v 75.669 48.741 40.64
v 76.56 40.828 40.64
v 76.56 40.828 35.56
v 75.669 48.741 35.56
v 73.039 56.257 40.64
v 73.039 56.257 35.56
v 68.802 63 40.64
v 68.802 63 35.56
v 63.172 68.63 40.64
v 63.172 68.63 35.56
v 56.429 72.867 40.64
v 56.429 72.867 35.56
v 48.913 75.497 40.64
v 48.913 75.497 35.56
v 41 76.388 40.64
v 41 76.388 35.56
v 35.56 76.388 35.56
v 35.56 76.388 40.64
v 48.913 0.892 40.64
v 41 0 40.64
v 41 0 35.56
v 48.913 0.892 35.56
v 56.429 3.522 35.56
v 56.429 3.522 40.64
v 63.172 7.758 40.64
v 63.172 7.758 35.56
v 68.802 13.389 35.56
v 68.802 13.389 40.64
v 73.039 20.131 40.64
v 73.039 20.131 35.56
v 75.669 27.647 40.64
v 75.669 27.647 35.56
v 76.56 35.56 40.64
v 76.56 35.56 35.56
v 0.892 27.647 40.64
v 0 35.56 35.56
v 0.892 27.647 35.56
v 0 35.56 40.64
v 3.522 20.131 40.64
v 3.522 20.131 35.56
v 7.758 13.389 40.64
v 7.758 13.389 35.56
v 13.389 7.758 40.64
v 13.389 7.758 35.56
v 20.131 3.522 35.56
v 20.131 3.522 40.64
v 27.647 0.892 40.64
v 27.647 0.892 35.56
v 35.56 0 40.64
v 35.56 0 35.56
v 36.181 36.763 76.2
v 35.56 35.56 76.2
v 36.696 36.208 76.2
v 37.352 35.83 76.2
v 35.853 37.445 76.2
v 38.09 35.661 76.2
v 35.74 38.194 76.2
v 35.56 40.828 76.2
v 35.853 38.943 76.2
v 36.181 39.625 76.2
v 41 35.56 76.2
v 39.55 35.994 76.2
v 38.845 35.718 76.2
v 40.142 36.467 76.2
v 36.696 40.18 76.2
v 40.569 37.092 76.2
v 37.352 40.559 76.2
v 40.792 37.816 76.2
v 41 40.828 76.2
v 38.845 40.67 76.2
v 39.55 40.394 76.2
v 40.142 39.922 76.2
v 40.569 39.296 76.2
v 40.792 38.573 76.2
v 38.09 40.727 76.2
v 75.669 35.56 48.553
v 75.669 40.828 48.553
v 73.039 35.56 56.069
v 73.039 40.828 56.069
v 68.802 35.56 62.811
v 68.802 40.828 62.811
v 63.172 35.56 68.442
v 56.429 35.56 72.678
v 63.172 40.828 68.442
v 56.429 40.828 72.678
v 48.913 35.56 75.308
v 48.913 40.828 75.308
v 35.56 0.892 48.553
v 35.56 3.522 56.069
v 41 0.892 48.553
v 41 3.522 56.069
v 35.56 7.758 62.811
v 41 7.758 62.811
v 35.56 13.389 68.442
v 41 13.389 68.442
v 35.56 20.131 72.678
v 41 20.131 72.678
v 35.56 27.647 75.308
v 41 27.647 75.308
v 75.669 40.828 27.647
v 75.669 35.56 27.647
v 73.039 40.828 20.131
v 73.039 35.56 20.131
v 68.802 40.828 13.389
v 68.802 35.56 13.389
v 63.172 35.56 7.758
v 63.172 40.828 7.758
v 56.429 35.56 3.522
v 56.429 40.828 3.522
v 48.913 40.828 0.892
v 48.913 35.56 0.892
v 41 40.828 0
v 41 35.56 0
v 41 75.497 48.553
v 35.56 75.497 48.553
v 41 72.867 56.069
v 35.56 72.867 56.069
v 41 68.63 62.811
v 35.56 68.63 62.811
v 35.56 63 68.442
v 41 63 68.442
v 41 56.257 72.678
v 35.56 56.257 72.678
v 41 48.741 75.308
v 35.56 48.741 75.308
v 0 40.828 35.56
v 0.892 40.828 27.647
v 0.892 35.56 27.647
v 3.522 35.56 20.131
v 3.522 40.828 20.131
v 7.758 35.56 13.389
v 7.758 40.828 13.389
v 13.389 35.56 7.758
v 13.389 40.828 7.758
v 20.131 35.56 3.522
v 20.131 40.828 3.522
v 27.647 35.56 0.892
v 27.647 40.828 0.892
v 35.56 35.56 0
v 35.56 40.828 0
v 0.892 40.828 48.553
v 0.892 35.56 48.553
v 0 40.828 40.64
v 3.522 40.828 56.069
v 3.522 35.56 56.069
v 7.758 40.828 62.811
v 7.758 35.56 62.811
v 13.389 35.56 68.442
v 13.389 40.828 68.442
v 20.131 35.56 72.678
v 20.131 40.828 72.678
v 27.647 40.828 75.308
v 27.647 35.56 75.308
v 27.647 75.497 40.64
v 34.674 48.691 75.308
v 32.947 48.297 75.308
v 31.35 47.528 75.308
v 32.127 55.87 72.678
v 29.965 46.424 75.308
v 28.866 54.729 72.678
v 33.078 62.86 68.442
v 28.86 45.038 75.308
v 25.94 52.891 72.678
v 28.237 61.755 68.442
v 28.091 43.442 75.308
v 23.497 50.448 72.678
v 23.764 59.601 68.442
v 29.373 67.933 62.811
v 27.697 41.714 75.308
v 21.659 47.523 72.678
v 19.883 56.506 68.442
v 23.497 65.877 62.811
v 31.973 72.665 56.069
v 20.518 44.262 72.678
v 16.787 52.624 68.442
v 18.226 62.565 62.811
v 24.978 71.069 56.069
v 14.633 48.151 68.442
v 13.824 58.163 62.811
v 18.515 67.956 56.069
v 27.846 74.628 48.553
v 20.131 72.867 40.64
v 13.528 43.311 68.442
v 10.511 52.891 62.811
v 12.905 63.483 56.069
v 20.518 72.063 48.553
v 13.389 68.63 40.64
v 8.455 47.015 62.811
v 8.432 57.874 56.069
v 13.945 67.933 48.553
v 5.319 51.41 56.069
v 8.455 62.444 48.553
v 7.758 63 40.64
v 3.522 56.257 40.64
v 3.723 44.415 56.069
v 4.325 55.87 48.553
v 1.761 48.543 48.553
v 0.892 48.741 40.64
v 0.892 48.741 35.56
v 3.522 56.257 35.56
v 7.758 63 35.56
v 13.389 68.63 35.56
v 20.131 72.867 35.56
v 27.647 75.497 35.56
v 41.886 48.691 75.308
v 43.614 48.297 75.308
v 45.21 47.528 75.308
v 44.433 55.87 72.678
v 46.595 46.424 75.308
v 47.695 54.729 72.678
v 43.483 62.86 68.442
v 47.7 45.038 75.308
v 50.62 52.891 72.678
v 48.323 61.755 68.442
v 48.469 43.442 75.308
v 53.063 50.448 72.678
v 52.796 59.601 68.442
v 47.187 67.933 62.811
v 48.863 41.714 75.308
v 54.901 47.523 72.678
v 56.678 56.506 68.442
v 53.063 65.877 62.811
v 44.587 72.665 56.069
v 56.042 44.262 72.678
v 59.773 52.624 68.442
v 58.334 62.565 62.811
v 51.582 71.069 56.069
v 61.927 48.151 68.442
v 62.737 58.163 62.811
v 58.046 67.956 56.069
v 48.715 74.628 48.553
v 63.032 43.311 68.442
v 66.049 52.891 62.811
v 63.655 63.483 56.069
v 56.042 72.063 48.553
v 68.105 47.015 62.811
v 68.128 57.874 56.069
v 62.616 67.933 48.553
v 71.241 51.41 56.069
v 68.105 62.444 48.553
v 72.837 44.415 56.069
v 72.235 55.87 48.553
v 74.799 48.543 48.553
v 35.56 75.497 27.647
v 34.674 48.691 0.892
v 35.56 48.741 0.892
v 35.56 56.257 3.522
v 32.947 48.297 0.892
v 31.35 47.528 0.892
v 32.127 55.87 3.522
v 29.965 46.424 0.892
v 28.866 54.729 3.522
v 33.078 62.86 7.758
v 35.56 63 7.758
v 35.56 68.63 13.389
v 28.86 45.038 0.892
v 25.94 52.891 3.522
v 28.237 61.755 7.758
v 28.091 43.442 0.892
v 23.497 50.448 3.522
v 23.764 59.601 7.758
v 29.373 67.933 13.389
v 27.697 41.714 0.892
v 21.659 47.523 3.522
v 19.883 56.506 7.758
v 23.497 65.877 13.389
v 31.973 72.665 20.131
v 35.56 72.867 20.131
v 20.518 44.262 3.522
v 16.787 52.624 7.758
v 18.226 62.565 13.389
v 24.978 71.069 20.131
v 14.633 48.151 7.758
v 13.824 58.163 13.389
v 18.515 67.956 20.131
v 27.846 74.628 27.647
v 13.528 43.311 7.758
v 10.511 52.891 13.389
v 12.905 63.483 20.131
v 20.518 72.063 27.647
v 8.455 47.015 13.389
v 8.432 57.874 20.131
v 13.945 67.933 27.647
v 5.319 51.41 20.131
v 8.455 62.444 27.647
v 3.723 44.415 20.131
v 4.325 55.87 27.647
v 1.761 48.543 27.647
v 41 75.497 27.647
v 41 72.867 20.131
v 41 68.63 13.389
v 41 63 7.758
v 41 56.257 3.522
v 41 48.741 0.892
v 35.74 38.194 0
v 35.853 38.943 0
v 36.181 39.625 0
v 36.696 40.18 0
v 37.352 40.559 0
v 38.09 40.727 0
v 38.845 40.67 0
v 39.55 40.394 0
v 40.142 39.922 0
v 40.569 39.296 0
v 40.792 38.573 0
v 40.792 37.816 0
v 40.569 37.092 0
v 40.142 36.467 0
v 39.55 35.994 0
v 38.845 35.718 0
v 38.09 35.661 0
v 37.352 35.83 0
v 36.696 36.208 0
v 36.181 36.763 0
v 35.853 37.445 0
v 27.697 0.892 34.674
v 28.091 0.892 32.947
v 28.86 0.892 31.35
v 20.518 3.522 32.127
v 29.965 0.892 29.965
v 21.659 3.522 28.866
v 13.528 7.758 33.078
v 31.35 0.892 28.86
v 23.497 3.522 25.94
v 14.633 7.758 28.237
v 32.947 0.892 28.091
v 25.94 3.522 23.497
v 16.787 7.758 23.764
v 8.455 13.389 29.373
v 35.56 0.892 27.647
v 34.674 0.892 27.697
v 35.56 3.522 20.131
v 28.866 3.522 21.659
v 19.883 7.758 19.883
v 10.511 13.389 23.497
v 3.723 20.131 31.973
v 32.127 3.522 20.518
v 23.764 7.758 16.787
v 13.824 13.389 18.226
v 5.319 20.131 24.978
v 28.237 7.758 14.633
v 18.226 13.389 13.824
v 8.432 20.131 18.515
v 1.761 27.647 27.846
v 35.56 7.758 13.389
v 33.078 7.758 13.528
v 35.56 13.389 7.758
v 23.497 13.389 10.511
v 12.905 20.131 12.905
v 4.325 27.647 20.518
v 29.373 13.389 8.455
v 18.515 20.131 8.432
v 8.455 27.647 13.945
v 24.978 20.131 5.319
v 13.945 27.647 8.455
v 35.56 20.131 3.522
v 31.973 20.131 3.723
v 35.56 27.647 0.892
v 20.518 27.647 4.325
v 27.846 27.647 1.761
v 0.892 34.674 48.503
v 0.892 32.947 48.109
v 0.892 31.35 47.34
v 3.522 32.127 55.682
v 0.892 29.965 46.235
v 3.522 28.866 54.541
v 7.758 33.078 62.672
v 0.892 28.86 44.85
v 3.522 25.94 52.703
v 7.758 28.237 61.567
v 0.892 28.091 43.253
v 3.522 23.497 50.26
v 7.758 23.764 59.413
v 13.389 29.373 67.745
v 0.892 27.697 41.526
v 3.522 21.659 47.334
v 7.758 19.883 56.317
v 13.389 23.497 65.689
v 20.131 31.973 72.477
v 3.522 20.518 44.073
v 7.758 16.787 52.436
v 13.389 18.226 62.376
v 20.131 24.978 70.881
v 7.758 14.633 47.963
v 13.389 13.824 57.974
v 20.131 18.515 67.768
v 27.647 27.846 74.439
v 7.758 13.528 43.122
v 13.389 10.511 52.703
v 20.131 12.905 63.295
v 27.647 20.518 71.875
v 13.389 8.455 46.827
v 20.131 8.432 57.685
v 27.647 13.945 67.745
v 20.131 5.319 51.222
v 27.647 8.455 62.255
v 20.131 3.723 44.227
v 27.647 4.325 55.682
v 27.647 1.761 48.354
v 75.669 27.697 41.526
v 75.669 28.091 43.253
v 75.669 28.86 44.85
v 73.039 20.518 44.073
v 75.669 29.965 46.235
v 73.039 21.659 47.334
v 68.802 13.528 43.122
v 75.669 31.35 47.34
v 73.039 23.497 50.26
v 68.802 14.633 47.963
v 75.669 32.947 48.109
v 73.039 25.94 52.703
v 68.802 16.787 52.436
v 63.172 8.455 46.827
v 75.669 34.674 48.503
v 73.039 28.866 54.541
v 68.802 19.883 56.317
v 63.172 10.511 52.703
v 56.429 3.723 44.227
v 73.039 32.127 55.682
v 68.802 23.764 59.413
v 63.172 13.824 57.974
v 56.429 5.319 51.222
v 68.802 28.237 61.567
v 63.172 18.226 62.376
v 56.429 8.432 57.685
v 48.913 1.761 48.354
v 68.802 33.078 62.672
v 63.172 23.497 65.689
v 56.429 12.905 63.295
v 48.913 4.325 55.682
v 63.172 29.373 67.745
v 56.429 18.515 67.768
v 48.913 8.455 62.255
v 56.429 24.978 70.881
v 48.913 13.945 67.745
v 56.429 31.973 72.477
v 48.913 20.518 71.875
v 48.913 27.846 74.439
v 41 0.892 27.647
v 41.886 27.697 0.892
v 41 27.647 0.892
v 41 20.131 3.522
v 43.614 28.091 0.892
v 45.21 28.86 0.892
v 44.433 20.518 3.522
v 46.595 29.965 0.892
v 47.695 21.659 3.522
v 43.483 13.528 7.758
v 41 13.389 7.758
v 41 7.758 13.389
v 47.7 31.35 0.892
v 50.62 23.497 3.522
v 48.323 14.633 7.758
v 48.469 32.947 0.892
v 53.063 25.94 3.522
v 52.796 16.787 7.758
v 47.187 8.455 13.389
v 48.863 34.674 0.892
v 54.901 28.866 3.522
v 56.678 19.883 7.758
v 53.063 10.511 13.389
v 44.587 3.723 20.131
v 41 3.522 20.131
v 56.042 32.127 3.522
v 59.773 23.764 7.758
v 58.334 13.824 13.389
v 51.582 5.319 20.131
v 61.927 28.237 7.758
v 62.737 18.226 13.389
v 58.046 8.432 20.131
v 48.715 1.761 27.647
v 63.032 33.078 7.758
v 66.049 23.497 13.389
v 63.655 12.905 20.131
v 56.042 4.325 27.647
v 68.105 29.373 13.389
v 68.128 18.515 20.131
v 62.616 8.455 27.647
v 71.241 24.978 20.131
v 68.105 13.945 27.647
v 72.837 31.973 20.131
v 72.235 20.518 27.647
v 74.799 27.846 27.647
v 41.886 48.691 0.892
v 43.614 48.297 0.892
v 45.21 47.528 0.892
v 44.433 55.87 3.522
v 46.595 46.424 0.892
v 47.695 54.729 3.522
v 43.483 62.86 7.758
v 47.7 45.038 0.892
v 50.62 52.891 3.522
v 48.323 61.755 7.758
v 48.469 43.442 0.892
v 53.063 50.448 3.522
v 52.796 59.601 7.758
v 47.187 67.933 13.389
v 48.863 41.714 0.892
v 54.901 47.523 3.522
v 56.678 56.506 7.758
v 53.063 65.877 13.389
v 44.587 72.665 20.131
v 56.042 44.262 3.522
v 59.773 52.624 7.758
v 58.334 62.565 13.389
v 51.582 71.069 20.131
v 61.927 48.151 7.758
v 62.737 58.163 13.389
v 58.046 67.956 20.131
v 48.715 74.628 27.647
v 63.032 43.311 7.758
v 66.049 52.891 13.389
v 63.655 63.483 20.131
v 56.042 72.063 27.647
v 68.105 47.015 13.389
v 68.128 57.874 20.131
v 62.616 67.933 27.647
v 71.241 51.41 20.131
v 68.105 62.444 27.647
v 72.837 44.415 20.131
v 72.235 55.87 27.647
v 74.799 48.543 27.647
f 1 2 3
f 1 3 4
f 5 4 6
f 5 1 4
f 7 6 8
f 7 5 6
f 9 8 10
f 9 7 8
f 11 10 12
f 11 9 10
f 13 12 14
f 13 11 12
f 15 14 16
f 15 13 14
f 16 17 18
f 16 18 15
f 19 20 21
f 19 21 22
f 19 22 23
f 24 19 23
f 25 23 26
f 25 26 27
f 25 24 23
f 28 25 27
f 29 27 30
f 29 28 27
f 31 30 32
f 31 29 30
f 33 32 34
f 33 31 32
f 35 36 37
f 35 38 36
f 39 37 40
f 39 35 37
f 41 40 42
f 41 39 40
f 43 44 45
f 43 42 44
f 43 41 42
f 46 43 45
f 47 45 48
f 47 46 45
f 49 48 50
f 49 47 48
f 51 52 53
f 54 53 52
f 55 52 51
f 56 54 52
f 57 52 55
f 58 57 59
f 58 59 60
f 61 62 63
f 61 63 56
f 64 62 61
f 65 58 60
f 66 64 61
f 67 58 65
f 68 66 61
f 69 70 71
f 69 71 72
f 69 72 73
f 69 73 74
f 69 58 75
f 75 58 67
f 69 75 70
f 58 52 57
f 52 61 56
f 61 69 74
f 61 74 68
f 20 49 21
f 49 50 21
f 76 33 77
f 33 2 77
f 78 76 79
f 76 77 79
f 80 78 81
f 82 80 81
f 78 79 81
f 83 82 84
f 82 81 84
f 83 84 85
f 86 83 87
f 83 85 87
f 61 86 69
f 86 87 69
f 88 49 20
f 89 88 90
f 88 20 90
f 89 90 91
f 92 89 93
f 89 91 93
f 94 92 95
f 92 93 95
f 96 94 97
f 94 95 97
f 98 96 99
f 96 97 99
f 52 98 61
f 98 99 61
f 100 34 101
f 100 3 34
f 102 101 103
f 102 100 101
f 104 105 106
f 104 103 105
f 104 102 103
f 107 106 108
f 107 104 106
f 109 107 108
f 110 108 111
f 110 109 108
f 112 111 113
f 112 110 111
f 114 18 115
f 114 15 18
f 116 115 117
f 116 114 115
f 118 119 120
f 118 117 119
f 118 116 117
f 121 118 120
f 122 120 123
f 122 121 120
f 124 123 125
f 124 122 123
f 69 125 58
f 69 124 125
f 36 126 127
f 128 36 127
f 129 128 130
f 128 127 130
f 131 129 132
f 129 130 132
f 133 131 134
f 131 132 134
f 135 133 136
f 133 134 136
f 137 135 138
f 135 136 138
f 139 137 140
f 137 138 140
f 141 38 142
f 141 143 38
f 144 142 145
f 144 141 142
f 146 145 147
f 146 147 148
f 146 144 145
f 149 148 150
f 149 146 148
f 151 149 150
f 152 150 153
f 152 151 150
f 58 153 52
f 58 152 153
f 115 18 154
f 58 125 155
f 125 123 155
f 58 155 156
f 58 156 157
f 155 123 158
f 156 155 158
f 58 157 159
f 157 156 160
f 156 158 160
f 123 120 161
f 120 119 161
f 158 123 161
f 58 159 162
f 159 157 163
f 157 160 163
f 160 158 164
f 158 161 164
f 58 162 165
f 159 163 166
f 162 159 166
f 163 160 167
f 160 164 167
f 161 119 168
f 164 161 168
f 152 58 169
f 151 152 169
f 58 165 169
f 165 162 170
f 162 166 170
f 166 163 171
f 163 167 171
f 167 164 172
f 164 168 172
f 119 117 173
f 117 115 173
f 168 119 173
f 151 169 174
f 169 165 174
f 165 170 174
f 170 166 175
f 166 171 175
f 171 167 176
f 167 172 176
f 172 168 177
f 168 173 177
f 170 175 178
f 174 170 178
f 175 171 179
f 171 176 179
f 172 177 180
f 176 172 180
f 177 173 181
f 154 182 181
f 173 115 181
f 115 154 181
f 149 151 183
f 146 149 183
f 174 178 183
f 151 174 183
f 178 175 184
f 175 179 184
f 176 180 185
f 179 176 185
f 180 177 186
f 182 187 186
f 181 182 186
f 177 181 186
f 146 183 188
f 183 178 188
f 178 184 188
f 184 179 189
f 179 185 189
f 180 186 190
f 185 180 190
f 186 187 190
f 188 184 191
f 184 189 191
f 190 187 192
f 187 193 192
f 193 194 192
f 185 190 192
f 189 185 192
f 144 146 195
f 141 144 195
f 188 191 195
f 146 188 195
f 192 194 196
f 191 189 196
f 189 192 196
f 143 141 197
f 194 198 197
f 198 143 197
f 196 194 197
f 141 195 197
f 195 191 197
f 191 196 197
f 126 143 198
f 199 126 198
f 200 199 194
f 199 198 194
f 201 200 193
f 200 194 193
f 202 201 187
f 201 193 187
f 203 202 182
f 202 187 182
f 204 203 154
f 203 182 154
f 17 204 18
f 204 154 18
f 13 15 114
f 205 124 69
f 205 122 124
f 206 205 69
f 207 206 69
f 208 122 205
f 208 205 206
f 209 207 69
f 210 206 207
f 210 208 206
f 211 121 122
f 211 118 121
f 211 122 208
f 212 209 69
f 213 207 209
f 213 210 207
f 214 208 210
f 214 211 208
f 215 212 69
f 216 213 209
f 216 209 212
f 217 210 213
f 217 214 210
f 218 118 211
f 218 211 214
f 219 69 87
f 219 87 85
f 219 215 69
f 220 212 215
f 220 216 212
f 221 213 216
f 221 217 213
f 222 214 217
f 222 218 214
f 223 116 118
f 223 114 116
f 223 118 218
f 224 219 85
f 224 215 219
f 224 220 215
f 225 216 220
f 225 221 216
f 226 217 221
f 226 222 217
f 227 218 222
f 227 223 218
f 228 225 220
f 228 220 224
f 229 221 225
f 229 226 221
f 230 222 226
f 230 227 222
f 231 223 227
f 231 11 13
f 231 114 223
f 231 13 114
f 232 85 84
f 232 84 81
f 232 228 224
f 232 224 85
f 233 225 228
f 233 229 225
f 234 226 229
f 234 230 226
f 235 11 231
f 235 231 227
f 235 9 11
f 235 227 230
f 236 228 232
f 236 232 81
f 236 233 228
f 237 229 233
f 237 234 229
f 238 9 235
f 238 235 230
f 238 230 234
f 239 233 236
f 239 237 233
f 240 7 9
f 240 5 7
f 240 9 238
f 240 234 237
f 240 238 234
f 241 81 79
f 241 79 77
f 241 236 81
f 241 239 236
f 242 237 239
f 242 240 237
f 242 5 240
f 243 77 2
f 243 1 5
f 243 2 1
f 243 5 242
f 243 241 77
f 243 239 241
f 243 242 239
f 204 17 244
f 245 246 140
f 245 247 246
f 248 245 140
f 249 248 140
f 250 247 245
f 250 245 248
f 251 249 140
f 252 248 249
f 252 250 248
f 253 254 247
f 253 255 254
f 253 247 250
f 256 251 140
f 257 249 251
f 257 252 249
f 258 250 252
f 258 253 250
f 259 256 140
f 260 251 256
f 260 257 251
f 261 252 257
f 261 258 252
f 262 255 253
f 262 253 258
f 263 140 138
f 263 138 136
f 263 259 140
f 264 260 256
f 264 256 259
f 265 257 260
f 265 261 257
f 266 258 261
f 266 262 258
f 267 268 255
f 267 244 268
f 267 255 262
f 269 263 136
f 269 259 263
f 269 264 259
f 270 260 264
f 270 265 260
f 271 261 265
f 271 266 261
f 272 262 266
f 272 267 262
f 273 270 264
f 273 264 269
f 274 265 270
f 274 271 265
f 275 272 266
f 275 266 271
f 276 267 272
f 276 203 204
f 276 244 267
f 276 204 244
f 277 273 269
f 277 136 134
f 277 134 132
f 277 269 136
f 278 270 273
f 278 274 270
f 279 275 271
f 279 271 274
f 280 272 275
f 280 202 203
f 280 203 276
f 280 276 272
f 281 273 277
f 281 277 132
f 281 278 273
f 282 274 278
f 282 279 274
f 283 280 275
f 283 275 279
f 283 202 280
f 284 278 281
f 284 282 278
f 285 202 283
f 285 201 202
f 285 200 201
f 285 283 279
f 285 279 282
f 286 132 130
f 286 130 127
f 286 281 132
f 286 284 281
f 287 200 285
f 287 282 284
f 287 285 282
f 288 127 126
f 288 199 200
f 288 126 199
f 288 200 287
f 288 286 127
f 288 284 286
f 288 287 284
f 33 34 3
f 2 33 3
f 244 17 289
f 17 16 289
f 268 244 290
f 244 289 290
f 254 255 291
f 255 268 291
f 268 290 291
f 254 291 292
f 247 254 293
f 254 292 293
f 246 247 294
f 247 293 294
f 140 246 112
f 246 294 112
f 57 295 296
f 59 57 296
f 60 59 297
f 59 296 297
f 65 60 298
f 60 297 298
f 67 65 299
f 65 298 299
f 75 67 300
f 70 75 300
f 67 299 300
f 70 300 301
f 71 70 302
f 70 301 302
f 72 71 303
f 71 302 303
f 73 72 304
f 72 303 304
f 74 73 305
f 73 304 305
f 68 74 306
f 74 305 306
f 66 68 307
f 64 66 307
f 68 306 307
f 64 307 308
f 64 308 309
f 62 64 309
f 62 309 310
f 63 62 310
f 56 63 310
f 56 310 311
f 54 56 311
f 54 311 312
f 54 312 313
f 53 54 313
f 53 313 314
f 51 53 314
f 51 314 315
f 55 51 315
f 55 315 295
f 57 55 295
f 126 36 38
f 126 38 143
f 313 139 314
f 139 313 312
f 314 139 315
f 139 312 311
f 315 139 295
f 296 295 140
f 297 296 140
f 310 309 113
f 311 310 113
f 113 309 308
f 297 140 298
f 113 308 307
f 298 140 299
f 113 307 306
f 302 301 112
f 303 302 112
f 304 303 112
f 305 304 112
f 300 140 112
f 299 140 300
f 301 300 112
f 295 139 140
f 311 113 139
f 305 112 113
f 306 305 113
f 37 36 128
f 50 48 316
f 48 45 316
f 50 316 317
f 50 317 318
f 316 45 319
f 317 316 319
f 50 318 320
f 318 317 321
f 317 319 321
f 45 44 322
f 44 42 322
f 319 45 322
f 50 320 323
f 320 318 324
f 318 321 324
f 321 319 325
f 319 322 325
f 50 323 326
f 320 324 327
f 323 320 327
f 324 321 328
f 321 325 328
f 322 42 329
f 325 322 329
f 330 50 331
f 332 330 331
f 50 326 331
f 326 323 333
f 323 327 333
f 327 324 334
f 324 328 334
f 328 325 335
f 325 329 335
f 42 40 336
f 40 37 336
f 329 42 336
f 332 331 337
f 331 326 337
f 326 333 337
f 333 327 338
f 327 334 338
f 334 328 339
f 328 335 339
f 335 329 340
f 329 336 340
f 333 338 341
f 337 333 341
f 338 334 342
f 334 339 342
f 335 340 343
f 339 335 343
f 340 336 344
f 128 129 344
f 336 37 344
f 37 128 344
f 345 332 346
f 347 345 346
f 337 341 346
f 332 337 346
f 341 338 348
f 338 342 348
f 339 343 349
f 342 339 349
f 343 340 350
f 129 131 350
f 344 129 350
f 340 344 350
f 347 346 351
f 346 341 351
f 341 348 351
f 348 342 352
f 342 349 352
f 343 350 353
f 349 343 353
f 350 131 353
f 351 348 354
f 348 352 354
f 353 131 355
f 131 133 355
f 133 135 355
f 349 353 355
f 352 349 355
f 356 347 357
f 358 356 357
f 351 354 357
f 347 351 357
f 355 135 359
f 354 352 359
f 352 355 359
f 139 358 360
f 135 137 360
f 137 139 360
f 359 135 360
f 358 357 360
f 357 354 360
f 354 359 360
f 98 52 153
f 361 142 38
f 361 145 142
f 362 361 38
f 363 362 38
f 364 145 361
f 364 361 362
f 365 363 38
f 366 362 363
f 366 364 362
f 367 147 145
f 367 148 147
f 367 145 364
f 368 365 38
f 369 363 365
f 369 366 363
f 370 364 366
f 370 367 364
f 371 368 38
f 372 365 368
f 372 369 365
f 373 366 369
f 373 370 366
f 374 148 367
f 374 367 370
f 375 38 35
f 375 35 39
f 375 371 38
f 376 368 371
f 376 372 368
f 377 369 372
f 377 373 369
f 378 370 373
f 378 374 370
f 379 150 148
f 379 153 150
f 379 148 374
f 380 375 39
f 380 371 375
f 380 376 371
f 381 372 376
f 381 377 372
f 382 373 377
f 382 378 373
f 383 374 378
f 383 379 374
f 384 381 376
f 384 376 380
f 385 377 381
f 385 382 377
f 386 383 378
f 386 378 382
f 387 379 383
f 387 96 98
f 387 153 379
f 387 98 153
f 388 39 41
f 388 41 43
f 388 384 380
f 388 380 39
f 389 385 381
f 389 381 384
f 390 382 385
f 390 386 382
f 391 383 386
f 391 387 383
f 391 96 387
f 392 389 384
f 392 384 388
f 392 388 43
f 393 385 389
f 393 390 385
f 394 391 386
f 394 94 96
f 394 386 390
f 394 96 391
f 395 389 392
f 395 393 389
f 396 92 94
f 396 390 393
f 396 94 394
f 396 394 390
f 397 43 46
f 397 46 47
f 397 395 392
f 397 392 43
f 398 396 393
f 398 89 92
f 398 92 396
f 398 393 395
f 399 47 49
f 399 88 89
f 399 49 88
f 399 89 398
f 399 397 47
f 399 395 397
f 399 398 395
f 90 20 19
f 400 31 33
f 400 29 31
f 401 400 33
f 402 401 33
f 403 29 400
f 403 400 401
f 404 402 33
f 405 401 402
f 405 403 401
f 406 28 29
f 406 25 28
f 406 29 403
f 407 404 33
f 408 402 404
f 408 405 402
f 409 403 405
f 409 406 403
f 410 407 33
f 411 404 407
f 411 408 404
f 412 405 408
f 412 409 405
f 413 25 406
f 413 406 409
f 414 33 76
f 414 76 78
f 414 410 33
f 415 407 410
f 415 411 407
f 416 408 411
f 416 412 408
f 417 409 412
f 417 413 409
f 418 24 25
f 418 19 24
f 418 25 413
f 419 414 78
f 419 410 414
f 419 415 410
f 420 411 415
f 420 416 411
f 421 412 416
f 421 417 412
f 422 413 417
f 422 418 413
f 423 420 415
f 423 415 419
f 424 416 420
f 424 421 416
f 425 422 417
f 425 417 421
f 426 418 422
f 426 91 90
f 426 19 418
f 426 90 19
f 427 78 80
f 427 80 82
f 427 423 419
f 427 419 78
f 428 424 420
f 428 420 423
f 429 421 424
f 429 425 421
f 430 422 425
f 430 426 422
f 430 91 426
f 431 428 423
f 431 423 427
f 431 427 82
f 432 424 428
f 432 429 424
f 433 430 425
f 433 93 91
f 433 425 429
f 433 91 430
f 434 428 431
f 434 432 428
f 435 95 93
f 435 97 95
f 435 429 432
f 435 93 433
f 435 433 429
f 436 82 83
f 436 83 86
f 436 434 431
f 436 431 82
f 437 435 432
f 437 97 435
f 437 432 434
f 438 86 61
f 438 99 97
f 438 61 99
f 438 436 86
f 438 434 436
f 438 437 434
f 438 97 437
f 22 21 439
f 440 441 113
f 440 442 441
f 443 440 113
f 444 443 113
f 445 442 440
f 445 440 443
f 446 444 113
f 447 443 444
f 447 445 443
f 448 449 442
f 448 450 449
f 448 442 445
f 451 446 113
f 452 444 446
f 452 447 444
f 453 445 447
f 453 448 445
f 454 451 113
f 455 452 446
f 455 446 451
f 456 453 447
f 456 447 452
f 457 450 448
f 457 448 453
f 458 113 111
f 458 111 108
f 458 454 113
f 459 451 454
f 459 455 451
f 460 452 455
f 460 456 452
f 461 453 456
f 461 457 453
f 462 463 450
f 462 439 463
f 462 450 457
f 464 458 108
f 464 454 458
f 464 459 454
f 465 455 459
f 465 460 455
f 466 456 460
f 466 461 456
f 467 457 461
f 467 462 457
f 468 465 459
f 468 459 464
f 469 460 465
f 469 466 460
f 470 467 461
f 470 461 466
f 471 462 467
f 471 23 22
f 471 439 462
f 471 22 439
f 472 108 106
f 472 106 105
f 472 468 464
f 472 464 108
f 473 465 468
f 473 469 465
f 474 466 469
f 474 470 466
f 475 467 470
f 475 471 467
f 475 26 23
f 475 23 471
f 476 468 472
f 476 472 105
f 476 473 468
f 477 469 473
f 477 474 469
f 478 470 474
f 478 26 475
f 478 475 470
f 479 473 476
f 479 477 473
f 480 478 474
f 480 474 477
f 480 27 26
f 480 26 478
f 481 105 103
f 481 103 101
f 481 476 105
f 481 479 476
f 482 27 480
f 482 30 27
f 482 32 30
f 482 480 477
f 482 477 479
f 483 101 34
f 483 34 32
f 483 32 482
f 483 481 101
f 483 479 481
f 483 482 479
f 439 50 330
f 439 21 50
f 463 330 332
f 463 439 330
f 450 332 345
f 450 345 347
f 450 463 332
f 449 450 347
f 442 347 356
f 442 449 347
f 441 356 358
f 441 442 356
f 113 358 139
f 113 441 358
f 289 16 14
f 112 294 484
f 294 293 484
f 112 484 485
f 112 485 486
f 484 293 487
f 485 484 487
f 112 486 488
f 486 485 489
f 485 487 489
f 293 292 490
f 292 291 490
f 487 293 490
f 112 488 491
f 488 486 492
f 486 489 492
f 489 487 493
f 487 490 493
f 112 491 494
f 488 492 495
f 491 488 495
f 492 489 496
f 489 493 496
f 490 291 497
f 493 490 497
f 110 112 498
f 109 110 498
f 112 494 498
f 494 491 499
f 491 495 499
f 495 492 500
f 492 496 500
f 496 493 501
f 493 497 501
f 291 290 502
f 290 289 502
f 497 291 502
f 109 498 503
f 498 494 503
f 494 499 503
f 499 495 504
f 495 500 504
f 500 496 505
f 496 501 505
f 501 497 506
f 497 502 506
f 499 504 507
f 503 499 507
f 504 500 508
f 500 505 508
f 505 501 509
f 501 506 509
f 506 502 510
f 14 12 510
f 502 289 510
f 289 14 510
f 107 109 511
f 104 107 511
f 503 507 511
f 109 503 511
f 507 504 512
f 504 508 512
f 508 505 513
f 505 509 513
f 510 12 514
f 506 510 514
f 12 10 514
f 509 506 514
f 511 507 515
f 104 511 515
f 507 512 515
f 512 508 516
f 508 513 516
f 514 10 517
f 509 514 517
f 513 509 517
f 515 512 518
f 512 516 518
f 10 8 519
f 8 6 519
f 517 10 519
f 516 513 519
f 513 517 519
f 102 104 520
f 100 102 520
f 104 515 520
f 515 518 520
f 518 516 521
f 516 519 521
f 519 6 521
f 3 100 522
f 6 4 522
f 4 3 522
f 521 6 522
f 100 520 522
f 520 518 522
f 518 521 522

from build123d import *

# Parameters (mm, degrees)
F1_W     = 76.560207
F1_H     = 76.388307
F2_DEPTH = 76.2
F3_R     = 35.56
F0_D     = 5.08


with BuildPart() as f2:
    # F1 (on Top) → F2 (new body)
    with BuildSketch(Plane.XY):
        with Locations((38.280103, 38.194153)):
            Rectangle(F1_W, F1_H)
    extrude(amount=F2_DEPTH)

    # F3
    f3_edges = [f2.edges().sort_by_distance(p)[0] for p in [
        (76.560207, 76.388307, 38.1),
        (0, 76.388307, 38.1),
        (38.280103, 76.388307, 0),
        (38.280103, 76.388307, 76.2),
        (38.280103, 0, 76.2),
        (0, 38.194153, 76.2),
        (76.560207, 0, 38.1),
        (0, 38.194153, 0),
        (0, 0, 38.1),
        (38.280103, 0, 0),
        (76.560207, 38.194153, 0),
        (76.560207, 38.194153, 76.2),
    ]]
    fillet(f3_edges, radius=F3_R)

    # F0 (through all)
    with Locations(Plane.XY.offset(76.2)):
        with Locations((38.280103, 38.194153)):
            Hole(F0_D / 2)


solid = f2.part
